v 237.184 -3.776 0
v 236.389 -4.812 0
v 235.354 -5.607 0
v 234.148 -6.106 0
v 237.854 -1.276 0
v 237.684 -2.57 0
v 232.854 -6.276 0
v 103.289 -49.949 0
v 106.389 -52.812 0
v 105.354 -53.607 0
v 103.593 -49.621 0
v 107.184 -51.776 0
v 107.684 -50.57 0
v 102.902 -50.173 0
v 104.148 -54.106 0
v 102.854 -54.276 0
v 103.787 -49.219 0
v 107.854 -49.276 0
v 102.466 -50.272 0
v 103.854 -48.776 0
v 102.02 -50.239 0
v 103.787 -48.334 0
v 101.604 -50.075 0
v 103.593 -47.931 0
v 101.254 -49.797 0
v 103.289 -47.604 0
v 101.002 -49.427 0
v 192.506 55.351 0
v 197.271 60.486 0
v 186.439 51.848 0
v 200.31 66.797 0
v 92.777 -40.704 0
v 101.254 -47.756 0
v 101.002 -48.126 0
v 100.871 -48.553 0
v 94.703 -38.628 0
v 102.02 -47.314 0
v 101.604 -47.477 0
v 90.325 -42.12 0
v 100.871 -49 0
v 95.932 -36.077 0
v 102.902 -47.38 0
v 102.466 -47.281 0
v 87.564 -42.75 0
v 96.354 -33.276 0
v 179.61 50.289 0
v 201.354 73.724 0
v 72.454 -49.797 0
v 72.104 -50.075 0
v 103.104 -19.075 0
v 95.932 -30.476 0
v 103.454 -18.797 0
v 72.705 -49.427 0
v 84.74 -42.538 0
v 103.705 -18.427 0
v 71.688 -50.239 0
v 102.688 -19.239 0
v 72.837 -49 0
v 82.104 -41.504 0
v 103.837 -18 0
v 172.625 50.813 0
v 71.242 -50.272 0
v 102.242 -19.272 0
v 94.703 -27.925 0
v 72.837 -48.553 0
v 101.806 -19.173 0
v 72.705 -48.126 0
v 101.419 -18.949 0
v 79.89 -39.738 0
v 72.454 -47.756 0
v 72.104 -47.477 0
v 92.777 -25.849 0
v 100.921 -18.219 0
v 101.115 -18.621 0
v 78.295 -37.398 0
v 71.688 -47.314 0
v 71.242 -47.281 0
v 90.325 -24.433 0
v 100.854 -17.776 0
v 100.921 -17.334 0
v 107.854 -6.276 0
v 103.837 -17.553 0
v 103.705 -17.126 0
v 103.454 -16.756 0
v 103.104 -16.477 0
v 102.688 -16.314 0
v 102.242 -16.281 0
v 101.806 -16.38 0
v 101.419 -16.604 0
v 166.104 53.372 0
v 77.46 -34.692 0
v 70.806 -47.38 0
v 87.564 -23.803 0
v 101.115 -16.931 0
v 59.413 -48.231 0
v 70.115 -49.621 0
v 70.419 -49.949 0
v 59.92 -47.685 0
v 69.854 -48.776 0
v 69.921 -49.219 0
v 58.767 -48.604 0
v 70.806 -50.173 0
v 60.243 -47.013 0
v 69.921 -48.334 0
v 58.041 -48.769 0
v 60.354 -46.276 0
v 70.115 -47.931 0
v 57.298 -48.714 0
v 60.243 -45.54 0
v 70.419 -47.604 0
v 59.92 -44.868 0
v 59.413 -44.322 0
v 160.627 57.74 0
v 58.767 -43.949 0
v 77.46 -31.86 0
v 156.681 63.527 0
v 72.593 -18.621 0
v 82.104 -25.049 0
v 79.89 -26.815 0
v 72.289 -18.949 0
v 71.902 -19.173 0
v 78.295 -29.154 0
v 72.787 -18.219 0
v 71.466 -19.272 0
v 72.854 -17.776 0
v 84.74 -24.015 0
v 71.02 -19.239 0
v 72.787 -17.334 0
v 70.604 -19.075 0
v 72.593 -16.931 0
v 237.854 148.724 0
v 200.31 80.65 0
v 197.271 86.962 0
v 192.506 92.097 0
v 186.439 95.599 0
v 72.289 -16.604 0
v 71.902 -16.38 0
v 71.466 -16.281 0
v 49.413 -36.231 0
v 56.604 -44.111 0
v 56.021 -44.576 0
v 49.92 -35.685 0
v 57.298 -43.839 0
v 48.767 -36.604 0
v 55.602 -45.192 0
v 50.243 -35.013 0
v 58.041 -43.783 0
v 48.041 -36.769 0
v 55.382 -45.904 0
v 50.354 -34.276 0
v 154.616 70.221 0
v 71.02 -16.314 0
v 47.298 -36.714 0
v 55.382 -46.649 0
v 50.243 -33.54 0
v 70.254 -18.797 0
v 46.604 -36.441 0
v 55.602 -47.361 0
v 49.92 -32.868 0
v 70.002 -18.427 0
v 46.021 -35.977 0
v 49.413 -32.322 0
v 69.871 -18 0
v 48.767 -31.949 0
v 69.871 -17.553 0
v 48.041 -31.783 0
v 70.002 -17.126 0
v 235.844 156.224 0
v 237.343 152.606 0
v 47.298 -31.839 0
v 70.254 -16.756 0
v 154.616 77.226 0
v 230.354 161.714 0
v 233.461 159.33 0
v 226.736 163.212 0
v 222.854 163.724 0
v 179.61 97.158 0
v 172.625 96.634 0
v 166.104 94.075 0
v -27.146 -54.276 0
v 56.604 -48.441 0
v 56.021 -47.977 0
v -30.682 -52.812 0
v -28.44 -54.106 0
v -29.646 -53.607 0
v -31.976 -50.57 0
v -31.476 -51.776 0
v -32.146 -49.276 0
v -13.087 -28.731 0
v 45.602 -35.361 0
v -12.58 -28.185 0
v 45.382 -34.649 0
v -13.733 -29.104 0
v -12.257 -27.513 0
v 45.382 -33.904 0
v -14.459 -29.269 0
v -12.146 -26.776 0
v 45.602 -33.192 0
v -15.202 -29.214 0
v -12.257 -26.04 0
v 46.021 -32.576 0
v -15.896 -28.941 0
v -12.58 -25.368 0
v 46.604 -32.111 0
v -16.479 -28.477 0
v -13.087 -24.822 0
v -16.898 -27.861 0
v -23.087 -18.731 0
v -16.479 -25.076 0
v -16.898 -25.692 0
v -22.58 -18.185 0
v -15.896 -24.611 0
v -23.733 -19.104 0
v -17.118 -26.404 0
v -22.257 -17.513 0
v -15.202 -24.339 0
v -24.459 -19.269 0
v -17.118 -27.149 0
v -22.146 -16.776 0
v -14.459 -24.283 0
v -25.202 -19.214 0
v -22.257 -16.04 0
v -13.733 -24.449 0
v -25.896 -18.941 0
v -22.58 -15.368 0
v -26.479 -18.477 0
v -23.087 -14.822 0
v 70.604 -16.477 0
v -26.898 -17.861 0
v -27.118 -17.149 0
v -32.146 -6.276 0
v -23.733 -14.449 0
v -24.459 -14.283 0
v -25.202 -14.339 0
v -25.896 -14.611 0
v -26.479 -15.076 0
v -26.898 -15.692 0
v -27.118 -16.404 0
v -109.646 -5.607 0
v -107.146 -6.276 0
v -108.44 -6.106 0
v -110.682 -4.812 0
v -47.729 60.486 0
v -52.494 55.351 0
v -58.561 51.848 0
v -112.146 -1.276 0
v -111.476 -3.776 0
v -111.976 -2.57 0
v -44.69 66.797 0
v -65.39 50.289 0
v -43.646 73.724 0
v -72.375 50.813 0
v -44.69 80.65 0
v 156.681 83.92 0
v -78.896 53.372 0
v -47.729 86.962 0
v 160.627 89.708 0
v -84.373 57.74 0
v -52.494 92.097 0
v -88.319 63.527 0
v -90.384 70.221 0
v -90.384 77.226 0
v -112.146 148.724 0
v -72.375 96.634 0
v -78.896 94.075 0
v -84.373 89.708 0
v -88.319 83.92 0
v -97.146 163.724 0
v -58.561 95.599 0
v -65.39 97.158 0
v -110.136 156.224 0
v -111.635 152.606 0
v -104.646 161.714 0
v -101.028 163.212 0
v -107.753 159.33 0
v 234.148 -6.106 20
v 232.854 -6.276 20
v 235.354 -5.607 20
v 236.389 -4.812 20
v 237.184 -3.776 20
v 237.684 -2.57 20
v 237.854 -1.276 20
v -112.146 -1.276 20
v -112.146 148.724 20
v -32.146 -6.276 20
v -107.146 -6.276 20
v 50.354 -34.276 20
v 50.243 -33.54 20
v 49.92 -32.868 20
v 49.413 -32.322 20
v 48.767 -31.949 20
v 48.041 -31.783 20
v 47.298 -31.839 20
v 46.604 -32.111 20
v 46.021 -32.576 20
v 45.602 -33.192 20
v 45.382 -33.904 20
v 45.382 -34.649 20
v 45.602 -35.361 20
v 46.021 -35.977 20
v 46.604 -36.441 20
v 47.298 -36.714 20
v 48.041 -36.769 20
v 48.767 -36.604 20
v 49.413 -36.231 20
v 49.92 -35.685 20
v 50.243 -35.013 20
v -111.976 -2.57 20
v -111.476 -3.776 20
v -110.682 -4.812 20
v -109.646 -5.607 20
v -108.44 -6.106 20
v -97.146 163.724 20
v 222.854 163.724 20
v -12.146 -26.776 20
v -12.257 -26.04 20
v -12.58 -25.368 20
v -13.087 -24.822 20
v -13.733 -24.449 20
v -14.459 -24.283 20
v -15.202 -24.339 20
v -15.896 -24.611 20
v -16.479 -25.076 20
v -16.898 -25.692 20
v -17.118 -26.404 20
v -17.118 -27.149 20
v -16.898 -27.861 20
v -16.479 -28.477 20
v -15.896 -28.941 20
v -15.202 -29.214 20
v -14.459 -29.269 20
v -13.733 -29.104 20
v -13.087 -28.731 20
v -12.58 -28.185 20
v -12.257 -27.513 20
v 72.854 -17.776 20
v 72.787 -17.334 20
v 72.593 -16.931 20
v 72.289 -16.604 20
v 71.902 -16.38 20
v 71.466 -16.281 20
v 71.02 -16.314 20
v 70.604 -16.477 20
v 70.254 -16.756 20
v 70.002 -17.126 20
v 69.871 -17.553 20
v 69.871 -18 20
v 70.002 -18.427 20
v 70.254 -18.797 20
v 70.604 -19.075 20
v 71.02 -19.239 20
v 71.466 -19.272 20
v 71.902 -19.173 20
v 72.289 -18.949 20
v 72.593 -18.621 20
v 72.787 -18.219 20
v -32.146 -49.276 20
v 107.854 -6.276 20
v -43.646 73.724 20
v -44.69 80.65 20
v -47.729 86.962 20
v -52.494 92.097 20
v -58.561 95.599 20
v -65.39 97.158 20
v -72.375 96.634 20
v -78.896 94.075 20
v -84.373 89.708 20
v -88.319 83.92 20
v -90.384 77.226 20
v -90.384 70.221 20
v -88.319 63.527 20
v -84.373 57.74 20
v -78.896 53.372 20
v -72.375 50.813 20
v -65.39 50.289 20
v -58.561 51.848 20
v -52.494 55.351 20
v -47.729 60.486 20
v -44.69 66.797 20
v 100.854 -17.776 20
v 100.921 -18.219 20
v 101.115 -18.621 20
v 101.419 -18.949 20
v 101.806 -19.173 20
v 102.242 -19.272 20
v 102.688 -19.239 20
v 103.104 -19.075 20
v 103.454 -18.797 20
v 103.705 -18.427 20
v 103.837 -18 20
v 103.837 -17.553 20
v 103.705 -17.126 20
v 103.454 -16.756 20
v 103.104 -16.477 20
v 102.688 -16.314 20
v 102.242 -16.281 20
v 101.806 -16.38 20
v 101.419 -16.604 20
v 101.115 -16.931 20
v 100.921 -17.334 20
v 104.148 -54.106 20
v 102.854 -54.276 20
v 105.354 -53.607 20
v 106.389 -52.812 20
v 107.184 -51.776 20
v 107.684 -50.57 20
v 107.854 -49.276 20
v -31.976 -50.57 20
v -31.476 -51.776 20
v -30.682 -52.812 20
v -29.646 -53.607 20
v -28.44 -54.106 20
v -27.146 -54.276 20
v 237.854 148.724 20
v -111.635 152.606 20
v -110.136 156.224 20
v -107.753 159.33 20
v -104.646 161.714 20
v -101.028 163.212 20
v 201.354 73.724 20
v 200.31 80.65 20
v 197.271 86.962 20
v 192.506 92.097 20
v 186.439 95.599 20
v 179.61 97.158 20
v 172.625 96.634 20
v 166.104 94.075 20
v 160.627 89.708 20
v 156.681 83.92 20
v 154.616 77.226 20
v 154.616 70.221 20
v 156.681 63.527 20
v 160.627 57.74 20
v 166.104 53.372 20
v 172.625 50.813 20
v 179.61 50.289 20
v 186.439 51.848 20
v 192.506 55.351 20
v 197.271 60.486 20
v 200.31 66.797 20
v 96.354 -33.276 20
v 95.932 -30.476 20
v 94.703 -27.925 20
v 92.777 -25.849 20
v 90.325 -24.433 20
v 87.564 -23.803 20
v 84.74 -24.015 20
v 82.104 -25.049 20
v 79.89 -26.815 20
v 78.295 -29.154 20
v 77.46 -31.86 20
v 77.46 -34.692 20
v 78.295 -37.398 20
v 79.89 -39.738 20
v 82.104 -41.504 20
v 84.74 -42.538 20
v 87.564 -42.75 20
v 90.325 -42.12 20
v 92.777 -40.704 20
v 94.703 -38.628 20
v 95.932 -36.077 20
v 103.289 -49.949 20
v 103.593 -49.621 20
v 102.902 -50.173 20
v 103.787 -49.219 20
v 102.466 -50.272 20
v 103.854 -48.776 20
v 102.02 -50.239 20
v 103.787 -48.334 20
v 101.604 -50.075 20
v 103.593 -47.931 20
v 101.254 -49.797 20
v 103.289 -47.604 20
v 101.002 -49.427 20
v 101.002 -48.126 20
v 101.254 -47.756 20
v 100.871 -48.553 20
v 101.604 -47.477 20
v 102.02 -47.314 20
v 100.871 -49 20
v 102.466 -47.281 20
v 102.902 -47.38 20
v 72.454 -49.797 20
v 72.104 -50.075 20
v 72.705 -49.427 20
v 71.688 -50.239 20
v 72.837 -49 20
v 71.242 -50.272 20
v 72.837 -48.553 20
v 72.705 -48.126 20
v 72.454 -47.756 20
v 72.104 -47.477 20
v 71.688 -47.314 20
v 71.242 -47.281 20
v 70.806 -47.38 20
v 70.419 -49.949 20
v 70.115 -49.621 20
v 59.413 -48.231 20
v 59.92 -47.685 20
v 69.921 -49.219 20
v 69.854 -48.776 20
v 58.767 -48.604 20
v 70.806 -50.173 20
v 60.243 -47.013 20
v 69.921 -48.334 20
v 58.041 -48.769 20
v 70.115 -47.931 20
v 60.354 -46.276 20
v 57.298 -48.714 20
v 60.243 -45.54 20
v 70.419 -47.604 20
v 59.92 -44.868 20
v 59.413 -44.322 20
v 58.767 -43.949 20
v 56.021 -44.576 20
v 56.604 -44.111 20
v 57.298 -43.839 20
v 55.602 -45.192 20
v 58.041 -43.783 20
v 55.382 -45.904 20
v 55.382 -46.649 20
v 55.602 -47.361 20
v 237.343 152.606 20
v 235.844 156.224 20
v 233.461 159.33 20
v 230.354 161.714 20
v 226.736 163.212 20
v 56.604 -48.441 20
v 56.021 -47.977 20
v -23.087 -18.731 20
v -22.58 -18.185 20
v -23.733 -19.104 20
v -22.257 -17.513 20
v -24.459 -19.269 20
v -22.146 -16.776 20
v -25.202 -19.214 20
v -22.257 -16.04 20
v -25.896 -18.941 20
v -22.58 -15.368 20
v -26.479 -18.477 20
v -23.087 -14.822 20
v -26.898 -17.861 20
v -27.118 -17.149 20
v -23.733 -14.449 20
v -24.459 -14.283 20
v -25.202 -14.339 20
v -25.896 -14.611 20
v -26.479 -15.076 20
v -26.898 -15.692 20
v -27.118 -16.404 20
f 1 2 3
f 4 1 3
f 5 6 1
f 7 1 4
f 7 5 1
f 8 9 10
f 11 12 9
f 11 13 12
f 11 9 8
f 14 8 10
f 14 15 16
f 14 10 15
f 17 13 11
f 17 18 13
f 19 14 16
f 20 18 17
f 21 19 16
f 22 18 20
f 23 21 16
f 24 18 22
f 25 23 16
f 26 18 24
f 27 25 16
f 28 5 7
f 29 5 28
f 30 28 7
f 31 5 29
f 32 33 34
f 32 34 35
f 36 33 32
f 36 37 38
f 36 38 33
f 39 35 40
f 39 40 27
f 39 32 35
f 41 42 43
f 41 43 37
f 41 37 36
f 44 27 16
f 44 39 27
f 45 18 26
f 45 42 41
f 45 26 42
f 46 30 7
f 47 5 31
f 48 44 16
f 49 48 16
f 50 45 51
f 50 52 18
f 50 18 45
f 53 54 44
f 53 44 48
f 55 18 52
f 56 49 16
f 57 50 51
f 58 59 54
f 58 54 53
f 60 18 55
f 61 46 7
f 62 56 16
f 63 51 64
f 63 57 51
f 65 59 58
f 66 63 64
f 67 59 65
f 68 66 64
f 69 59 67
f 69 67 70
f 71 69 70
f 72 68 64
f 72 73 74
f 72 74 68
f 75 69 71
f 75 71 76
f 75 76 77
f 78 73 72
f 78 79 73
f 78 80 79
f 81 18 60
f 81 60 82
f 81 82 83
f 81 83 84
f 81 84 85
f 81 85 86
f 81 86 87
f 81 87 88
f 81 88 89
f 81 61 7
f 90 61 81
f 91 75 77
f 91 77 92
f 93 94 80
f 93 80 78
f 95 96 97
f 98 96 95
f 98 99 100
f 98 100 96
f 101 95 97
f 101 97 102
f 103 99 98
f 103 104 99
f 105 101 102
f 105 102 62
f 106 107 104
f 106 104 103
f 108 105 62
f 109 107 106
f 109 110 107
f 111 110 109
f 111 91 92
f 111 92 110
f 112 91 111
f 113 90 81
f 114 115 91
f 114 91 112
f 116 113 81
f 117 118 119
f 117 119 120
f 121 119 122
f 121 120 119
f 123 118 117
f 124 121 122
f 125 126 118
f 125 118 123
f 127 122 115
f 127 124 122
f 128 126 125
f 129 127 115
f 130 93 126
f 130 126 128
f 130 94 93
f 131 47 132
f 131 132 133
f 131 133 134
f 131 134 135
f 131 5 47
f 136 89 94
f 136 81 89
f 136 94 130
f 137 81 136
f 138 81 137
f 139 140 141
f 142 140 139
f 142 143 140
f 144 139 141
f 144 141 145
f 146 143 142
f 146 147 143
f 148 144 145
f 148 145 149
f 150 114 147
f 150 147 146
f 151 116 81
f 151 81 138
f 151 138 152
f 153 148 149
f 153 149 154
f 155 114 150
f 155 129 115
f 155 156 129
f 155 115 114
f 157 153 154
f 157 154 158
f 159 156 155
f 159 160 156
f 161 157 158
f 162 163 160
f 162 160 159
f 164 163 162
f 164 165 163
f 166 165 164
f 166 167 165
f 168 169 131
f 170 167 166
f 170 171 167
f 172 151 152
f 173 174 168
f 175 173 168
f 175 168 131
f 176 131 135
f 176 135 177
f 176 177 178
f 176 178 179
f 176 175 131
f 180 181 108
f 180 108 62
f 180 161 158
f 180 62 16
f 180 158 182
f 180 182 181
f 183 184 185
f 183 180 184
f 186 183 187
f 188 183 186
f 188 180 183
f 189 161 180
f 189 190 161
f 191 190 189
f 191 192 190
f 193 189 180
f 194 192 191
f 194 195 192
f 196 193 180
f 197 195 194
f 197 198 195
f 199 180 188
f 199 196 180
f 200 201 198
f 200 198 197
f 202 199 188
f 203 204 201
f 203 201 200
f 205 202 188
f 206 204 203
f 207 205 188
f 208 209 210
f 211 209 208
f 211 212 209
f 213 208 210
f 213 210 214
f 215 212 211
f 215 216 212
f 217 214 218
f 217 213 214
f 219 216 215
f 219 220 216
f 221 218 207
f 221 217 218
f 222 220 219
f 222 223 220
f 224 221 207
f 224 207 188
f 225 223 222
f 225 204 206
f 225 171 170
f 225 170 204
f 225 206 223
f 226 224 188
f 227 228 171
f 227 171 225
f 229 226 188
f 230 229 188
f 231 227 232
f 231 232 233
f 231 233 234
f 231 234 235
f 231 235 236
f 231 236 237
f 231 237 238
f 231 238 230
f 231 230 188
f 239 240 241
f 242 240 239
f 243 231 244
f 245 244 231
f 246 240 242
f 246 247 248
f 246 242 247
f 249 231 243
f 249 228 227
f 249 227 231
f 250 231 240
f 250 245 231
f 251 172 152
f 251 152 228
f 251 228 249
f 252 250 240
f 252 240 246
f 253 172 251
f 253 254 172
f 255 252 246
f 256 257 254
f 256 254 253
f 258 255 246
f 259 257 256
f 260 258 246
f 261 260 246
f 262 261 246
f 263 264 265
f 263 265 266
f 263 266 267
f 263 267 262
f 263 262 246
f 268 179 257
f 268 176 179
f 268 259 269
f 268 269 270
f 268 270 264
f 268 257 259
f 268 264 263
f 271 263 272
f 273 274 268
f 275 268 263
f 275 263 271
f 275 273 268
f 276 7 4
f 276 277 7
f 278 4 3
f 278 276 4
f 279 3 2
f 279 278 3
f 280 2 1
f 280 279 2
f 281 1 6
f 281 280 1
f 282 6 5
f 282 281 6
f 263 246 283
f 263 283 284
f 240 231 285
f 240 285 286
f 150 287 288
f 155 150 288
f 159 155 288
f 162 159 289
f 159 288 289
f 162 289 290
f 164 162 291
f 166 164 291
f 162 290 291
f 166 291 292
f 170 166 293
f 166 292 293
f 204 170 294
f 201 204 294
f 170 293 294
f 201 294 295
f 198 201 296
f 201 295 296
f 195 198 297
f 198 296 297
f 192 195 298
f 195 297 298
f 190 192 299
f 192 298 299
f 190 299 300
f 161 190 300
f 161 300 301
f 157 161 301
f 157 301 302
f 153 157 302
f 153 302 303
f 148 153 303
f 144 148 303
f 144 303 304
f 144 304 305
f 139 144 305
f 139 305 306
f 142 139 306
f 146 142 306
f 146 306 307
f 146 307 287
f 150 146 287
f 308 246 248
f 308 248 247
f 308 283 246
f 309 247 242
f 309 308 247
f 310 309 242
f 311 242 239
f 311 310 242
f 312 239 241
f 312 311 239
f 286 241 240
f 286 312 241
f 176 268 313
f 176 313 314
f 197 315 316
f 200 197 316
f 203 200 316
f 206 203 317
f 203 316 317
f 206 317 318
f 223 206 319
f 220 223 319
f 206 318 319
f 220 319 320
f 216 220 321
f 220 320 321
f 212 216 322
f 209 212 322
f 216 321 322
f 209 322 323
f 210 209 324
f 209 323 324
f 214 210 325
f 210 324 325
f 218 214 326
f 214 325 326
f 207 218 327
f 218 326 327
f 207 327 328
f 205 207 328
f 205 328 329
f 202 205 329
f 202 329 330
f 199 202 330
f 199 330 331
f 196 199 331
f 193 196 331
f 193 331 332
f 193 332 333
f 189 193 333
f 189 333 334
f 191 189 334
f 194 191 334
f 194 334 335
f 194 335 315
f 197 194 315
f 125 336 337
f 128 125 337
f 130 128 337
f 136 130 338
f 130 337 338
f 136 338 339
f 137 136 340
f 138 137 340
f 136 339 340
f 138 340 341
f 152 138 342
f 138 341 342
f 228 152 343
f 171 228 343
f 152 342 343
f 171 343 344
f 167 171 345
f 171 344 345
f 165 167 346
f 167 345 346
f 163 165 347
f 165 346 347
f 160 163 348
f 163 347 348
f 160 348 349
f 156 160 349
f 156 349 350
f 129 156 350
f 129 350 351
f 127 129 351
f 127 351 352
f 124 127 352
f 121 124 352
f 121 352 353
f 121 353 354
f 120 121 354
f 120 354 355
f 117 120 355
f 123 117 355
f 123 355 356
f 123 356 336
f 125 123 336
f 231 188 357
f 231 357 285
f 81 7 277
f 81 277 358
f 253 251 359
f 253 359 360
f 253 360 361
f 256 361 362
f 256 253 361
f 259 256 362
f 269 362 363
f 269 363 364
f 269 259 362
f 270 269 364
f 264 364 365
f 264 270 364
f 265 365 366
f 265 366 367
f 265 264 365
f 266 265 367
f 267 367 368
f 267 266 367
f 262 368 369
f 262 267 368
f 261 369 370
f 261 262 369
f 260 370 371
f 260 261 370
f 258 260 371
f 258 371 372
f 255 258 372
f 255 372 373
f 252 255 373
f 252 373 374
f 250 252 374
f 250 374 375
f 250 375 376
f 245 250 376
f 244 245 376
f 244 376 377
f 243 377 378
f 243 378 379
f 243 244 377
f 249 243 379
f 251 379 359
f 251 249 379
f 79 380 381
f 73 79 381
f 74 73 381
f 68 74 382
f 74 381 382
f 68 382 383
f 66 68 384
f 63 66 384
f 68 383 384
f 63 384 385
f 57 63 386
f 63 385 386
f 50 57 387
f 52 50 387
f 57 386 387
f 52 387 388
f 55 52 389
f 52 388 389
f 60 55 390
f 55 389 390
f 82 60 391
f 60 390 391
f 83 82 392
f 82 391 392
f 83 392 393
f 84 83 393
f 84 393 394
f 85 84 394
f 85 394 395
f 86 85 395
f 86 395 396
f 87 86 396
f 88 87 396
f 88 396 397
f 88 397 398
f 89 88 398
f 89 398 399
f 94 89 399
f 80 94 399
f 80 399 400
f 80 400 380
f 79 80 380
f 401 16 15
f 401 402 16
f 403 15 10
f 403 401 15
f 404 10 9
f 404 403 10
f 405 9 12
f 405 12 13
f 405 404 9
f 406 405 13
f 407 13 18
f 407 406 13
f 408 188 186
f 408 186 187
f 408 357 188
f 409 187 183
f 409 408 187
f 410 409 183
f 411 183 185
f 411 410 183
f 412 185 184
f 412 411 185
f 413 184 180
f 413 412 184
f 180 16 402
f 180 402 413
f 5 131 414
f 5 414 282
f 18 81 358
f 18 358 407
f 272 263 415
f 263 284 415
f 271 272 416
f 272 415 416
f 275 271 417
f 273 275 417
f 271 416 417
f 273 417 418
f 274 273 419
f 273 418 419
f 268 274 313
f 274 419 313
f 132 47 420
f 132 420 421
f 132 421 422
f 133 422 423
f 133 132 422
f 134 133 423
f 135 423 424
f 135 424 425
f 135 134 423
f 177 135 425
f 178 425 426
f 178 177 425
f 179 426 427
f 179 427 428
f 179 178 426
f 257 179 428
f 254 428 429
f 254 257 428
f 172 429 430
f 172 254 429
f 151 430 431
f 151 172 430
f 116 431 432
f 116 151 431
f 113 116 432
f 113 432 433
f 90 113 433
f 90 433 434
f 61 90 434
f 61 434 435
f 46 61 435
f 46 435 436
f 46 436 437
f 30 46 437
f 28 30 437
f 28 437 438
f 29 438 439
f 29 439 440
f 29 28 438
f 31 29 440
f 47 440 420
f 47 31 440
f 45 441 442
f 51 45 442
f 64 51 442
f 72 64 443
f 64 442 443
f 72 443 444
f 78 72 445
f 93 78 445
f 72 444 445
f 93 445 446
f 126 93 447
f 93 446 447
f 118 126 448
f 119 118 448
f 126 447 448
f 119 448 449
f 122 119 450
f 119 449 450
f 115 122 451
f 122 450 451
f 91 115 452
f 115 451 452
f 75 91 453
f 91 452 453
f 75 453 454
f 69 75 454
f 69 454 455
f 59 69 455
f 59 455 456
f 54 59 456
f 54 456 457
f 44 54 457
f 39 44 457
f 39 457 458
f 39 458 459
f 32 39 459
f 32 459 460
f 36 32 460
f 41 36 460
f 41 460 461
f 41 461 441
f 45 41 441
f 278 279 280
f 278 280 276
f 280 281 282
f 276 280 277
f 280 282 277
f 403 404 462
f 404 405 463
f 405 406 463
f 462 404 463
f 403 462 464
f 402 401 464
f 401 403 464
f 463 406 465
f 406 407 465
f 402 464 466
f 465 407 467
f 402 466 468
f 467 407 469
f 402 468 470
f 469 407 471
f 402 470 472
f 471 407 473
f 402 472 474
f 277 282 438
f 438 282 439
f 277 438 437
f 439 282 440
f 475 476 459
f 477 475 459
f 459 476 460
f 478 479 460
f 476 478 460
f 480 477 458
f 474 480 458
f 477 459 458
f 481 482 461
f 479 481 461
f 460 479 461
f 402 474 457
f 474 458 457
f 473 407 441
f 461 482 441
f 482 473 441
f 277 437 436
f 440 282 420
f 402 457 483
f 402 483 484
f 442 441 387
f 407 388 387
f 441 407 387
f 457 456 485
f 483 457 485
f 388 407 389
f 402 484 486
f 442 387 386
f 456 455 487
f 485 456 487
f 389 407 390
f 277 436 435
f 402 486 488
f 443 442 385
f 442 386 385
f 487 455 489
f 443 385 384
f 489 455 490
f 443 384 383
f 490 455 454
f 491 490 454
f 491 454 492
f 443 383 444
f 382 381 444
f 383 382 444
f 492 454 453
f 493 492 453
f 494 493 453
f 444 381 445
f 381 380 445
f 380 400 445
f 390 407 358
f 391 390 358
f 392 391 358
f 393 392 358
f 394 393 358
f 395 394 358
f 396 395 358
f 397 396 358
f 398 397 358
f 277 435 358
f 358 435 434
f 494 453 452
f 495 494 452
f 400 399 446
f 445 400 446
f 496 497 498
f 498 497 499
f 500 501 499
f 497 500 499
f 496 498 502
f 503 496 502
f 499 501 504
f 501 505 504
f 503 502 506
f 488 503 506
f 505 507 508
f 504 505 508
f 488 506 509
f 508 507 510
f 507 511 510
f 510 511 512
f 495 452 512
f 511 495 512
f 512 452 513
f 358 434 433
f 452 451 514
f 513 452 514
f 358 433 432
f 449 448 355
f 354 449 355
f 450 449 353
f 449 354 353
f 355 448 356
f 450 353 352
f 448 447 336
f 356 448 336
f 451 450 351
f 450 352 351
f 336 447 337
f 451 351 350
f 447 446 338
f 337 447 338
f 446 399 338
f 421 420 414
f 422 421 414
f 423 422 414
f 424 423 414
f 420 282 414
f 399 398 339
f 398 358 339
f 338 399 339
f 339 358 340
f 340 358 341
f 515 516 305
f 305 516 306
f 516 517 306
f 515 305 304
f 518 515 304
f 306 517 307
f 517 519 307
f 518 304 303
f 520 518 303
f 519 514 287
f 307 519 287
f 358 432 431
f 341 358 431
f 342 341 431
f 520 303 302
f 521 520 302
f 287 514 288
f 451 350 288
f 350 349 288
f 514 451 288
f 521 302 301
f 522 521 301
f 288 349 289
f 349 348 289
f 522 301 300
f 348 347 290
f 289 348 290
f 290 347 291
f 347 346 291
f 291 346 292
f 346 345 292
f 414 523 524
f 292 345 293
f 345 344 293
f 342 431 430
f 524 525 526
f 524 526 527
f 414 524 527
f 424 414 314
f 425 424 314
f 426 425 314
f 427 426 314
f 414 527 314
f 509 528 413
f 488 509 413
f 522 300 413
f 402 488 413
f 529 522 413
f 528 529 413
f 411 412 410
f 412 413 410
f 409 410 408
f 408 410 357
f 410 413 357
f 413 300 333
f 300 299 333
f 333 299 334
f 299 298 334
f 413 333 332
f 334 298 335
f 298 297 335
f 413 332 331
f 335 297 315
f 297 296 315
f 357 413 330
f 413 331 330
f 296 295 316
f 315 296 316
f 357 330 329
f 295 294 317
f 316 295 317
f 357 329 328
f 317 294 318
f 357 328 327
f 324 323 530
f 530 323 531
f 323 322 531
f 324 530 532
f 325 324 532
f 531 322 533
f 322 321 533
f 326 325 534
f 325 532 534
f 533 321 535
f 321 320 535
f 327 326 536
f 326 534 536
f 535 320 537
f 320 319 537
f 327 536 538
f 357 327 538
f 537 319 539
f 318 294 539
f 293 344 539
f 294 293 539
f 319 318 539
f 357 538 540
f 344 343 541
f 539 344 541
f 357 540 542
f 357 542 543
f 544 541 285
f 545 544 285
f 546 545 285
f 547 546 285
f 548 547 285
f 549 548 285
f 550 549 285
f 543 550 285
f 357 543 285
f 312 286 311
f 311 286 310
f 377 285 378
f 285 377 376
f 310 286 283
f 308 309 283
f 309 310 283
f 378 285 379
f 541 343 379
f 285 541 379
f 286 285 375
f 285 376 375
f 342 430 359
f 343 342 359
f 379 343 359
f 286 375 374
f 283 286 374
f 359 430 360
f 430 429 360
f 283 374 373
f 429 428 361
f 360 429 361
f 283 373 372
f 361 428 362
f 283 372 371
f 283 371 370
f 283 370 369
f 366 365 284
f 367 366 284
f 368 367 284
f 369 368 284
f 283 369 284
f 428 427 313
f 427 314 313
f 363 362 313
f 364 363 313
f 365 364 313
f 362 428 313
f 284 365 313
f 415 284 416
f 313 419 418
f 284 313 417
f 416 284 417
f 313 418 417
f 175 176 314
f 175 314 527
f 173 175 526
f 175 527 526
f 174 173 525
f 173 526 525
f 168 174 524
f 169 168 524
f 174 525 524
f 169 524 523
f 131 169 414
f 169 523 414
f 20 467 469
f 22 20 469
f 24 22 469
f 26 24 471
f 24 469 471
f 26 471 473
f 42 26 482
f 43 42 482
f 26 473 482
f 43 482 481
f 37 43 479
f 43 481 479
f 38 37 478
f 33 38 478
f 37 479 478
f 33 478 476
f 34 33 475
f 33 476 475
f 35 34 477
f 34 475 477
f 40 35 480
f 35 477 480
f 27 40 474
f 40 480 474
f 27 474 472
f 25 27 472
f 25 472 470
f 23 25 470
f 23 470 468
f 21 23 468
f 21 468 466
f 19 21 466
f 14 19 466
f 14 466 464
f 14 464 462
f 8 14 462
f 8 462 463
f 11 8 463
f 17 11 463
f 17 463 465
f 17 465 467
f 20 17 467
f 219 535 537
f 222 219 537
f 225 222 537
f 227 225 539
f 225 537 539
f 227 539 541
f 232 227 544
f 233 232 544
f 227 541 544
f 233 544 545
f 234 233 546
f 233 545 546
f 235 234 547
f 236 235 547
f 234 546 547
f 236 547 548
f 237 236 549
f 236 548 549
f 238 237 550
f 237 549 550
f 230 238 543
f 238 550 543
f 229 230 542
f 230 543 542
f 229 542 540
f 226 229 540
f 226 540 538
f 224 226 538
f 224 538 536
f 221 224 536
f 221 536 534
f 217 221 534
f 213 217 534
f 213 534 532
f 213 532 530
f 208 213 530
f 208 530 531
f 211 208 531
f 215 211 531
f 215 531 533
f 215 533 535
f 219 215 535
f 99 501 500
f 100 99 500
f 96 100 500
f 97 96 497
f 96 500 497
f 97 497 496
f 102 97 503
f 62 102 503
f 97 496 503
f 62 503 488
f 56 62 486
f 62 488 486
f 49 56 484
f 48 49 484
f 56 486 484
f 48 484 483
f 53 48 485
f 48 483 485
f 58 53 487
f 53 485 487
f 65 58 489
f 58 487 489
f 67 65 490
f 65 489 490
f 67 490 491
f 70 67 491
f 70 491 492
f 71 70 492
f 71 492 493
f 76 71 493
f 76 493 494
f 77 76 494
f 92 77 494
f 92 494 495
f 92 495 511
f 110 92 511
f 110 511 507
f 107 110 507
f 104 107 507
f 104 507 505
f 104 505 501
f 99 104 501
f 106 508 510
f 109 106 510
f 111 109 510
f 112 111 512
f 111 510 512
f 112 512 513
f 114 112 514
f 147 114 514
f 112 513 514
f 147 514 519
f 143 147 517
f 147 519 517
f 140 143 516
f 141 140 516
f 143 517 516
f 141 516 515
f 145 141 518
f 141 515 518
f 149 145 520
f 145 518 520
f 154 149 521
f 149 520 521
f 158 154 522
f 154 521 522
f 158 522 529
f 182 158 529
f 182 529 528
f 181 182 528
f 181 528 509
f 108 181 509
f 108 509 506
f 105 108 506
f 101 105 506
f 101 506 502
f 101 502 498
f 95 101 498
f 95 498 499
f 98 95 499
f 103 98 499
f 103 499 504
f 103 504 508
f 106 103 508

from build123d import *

# Parameters (mm, degrees)
SKETCH_1_R          = 23.5
EXTRUDE_1_DEPTH     = 20
SKETCH_2_R          = 2.5
CUT_EXTRUDE_1_DEPTH = 290.447601331
SKETCH_5_R          = 2.5
CUT_EXTRUDE_3_DEPTH = 290.447601331
SKETCH_6_R          = 9.5
SKETCH_6_R_2        = 1.5
CUT_EXTRUDE_4_DEPTH = 290.447601331
FILLET_1_R          = 5
FILLET_2_R          = 5
FILLET_3_R          = 5
FILLET_4_R          = 5
FILLET_5_R          = 15
FILLET_6_R          = 15


with BuildPart() as part:
    # 草图1 → 凸台-拉伸1 (new body)
    with BuildSketch(Plane.XY):
        Polygon((-112.146066939, 163.723609917), (237.853933061, 163.723609917), (237.853933061, -6.276390083), (107.853933061, -6.276390083), (107.853933061, -54.276390083), (-32.146066939, -54.276390083), (-32.146066939, -6.276390083), (-112.146066939, -6.276390083), align=None)
        with Locations((177.853933061, 73.723609917)):
            Circle(SKETCH_1_R, mode=Mode.SUBTRACT)
        with Locations((-67.146066939, 73.723609917)):
            Circle(SKETCH_1_R, mode=Mode.SUBTRACT)
    extrude(amount=EXTRUDE_1_DEPTH)

    # 草图2 → 切除-拉伸1 (cut, through all)
    with BuildSketch(Plane.XY.offset(20)):
        with Locations((47.853933061, -34.276390083)):
            Circle(SKETCH_2_R)
        with Locations((57.853933061, -46.276390083)):
            Circle(SKETCH_2_R)
    extrude(amount=-CUT_EXTRUDE_1_DEPTH, mode=Mode.SUBTRACT)

    # 草图5 → 切除-拉伸3 (cut, through all)
    with BuildSketch(Plane.XY.offset(20)):
        with Locations((-24.646066939, -16.776390083)):
            Circle(SKETCH_5_R)
        with Locations((-14.646066939, -26.776390083)):
            Circle(SKETCH_5_R)
    extrude(amount=-CUT_EXTRUDE_3_DEPTH, mode=Mode.SUBTRACT)

    # 草图6 → 切除-拉伸4 (cut, through all)
    with BuildSketch(Plane.XY.offset(20)):
        with Locations((86.853933061, -33.276390083)):
            Circle(SKETCH_6_R)
        with Locations((71.353933061, -17.776390083)):
            Circle(SKETCH_6_R_2)
        with Locations(Location((71.353933061, -48.776390083, 0), (0, 0, 180))):
            Circle(SKETCH_6_R_2)
        with Locations((102.353933061, -48.776390083)):
            Circle(SKETCH_6_R_2)
        with Locations(Location((102.353933061, -17.776390083, 0), (0, 0, 180))):
            Circle(SKETCH_6_R_2)
    extrude(amount=-CUT_EXTRUDE_4_DEPTH, mode=Mode.SUBTRACT)

    # 圆角1
    fillet_1_edges = [part.edges().sort_by_distance(p)[0] for p in [
        (-32.146066939, -54.276390083, 10),
    ]]
    fillet(fillet_1_edges, radius=FILLET_1_R)

    # 圆角2
    fillet_2_edges = [part.edges().sort_by_distance(p)[0] for p in [
        (107.853933061, -54.276390083, 10),
    ]]
    fillet(fillet_2_edges, radius=FILLET_2_R)

    # 圆角3
    fillet_3_edges = [part.edges().sort_by_distance(p)[0] for p in [
        (237.853933061, -6.276390083, 10),
    ]]
    fillet(fillet_3_edges, radius=FILLET_3_R)

    # 圆角4
    fillet_4_edges = [part.edges().sort_by_distance(p)[0] for p in [
        (-112.146066939, -6.276390083, 10),
    ]]
    fillet(fillet_4_edges, radius=FILLET_4_R)

    # 圆角5
    fillet_5_edges = [part.edges().sort_by_distance(p)[0] for p in [
        (-112.146066939, 163.723609917, 10),
    ]]
    fillet(fillet_5_edges, radius=FILLET_5_R)

    # 圆角6
    fillet_6_edges = [part.edges().sort_by_distance(p)[0] for p in [
        (237.853933061, 163.723609917, 10),
    ]]
    fillet(fillet_6_edges, radius=FILLET_6_R)


solid = part.part
